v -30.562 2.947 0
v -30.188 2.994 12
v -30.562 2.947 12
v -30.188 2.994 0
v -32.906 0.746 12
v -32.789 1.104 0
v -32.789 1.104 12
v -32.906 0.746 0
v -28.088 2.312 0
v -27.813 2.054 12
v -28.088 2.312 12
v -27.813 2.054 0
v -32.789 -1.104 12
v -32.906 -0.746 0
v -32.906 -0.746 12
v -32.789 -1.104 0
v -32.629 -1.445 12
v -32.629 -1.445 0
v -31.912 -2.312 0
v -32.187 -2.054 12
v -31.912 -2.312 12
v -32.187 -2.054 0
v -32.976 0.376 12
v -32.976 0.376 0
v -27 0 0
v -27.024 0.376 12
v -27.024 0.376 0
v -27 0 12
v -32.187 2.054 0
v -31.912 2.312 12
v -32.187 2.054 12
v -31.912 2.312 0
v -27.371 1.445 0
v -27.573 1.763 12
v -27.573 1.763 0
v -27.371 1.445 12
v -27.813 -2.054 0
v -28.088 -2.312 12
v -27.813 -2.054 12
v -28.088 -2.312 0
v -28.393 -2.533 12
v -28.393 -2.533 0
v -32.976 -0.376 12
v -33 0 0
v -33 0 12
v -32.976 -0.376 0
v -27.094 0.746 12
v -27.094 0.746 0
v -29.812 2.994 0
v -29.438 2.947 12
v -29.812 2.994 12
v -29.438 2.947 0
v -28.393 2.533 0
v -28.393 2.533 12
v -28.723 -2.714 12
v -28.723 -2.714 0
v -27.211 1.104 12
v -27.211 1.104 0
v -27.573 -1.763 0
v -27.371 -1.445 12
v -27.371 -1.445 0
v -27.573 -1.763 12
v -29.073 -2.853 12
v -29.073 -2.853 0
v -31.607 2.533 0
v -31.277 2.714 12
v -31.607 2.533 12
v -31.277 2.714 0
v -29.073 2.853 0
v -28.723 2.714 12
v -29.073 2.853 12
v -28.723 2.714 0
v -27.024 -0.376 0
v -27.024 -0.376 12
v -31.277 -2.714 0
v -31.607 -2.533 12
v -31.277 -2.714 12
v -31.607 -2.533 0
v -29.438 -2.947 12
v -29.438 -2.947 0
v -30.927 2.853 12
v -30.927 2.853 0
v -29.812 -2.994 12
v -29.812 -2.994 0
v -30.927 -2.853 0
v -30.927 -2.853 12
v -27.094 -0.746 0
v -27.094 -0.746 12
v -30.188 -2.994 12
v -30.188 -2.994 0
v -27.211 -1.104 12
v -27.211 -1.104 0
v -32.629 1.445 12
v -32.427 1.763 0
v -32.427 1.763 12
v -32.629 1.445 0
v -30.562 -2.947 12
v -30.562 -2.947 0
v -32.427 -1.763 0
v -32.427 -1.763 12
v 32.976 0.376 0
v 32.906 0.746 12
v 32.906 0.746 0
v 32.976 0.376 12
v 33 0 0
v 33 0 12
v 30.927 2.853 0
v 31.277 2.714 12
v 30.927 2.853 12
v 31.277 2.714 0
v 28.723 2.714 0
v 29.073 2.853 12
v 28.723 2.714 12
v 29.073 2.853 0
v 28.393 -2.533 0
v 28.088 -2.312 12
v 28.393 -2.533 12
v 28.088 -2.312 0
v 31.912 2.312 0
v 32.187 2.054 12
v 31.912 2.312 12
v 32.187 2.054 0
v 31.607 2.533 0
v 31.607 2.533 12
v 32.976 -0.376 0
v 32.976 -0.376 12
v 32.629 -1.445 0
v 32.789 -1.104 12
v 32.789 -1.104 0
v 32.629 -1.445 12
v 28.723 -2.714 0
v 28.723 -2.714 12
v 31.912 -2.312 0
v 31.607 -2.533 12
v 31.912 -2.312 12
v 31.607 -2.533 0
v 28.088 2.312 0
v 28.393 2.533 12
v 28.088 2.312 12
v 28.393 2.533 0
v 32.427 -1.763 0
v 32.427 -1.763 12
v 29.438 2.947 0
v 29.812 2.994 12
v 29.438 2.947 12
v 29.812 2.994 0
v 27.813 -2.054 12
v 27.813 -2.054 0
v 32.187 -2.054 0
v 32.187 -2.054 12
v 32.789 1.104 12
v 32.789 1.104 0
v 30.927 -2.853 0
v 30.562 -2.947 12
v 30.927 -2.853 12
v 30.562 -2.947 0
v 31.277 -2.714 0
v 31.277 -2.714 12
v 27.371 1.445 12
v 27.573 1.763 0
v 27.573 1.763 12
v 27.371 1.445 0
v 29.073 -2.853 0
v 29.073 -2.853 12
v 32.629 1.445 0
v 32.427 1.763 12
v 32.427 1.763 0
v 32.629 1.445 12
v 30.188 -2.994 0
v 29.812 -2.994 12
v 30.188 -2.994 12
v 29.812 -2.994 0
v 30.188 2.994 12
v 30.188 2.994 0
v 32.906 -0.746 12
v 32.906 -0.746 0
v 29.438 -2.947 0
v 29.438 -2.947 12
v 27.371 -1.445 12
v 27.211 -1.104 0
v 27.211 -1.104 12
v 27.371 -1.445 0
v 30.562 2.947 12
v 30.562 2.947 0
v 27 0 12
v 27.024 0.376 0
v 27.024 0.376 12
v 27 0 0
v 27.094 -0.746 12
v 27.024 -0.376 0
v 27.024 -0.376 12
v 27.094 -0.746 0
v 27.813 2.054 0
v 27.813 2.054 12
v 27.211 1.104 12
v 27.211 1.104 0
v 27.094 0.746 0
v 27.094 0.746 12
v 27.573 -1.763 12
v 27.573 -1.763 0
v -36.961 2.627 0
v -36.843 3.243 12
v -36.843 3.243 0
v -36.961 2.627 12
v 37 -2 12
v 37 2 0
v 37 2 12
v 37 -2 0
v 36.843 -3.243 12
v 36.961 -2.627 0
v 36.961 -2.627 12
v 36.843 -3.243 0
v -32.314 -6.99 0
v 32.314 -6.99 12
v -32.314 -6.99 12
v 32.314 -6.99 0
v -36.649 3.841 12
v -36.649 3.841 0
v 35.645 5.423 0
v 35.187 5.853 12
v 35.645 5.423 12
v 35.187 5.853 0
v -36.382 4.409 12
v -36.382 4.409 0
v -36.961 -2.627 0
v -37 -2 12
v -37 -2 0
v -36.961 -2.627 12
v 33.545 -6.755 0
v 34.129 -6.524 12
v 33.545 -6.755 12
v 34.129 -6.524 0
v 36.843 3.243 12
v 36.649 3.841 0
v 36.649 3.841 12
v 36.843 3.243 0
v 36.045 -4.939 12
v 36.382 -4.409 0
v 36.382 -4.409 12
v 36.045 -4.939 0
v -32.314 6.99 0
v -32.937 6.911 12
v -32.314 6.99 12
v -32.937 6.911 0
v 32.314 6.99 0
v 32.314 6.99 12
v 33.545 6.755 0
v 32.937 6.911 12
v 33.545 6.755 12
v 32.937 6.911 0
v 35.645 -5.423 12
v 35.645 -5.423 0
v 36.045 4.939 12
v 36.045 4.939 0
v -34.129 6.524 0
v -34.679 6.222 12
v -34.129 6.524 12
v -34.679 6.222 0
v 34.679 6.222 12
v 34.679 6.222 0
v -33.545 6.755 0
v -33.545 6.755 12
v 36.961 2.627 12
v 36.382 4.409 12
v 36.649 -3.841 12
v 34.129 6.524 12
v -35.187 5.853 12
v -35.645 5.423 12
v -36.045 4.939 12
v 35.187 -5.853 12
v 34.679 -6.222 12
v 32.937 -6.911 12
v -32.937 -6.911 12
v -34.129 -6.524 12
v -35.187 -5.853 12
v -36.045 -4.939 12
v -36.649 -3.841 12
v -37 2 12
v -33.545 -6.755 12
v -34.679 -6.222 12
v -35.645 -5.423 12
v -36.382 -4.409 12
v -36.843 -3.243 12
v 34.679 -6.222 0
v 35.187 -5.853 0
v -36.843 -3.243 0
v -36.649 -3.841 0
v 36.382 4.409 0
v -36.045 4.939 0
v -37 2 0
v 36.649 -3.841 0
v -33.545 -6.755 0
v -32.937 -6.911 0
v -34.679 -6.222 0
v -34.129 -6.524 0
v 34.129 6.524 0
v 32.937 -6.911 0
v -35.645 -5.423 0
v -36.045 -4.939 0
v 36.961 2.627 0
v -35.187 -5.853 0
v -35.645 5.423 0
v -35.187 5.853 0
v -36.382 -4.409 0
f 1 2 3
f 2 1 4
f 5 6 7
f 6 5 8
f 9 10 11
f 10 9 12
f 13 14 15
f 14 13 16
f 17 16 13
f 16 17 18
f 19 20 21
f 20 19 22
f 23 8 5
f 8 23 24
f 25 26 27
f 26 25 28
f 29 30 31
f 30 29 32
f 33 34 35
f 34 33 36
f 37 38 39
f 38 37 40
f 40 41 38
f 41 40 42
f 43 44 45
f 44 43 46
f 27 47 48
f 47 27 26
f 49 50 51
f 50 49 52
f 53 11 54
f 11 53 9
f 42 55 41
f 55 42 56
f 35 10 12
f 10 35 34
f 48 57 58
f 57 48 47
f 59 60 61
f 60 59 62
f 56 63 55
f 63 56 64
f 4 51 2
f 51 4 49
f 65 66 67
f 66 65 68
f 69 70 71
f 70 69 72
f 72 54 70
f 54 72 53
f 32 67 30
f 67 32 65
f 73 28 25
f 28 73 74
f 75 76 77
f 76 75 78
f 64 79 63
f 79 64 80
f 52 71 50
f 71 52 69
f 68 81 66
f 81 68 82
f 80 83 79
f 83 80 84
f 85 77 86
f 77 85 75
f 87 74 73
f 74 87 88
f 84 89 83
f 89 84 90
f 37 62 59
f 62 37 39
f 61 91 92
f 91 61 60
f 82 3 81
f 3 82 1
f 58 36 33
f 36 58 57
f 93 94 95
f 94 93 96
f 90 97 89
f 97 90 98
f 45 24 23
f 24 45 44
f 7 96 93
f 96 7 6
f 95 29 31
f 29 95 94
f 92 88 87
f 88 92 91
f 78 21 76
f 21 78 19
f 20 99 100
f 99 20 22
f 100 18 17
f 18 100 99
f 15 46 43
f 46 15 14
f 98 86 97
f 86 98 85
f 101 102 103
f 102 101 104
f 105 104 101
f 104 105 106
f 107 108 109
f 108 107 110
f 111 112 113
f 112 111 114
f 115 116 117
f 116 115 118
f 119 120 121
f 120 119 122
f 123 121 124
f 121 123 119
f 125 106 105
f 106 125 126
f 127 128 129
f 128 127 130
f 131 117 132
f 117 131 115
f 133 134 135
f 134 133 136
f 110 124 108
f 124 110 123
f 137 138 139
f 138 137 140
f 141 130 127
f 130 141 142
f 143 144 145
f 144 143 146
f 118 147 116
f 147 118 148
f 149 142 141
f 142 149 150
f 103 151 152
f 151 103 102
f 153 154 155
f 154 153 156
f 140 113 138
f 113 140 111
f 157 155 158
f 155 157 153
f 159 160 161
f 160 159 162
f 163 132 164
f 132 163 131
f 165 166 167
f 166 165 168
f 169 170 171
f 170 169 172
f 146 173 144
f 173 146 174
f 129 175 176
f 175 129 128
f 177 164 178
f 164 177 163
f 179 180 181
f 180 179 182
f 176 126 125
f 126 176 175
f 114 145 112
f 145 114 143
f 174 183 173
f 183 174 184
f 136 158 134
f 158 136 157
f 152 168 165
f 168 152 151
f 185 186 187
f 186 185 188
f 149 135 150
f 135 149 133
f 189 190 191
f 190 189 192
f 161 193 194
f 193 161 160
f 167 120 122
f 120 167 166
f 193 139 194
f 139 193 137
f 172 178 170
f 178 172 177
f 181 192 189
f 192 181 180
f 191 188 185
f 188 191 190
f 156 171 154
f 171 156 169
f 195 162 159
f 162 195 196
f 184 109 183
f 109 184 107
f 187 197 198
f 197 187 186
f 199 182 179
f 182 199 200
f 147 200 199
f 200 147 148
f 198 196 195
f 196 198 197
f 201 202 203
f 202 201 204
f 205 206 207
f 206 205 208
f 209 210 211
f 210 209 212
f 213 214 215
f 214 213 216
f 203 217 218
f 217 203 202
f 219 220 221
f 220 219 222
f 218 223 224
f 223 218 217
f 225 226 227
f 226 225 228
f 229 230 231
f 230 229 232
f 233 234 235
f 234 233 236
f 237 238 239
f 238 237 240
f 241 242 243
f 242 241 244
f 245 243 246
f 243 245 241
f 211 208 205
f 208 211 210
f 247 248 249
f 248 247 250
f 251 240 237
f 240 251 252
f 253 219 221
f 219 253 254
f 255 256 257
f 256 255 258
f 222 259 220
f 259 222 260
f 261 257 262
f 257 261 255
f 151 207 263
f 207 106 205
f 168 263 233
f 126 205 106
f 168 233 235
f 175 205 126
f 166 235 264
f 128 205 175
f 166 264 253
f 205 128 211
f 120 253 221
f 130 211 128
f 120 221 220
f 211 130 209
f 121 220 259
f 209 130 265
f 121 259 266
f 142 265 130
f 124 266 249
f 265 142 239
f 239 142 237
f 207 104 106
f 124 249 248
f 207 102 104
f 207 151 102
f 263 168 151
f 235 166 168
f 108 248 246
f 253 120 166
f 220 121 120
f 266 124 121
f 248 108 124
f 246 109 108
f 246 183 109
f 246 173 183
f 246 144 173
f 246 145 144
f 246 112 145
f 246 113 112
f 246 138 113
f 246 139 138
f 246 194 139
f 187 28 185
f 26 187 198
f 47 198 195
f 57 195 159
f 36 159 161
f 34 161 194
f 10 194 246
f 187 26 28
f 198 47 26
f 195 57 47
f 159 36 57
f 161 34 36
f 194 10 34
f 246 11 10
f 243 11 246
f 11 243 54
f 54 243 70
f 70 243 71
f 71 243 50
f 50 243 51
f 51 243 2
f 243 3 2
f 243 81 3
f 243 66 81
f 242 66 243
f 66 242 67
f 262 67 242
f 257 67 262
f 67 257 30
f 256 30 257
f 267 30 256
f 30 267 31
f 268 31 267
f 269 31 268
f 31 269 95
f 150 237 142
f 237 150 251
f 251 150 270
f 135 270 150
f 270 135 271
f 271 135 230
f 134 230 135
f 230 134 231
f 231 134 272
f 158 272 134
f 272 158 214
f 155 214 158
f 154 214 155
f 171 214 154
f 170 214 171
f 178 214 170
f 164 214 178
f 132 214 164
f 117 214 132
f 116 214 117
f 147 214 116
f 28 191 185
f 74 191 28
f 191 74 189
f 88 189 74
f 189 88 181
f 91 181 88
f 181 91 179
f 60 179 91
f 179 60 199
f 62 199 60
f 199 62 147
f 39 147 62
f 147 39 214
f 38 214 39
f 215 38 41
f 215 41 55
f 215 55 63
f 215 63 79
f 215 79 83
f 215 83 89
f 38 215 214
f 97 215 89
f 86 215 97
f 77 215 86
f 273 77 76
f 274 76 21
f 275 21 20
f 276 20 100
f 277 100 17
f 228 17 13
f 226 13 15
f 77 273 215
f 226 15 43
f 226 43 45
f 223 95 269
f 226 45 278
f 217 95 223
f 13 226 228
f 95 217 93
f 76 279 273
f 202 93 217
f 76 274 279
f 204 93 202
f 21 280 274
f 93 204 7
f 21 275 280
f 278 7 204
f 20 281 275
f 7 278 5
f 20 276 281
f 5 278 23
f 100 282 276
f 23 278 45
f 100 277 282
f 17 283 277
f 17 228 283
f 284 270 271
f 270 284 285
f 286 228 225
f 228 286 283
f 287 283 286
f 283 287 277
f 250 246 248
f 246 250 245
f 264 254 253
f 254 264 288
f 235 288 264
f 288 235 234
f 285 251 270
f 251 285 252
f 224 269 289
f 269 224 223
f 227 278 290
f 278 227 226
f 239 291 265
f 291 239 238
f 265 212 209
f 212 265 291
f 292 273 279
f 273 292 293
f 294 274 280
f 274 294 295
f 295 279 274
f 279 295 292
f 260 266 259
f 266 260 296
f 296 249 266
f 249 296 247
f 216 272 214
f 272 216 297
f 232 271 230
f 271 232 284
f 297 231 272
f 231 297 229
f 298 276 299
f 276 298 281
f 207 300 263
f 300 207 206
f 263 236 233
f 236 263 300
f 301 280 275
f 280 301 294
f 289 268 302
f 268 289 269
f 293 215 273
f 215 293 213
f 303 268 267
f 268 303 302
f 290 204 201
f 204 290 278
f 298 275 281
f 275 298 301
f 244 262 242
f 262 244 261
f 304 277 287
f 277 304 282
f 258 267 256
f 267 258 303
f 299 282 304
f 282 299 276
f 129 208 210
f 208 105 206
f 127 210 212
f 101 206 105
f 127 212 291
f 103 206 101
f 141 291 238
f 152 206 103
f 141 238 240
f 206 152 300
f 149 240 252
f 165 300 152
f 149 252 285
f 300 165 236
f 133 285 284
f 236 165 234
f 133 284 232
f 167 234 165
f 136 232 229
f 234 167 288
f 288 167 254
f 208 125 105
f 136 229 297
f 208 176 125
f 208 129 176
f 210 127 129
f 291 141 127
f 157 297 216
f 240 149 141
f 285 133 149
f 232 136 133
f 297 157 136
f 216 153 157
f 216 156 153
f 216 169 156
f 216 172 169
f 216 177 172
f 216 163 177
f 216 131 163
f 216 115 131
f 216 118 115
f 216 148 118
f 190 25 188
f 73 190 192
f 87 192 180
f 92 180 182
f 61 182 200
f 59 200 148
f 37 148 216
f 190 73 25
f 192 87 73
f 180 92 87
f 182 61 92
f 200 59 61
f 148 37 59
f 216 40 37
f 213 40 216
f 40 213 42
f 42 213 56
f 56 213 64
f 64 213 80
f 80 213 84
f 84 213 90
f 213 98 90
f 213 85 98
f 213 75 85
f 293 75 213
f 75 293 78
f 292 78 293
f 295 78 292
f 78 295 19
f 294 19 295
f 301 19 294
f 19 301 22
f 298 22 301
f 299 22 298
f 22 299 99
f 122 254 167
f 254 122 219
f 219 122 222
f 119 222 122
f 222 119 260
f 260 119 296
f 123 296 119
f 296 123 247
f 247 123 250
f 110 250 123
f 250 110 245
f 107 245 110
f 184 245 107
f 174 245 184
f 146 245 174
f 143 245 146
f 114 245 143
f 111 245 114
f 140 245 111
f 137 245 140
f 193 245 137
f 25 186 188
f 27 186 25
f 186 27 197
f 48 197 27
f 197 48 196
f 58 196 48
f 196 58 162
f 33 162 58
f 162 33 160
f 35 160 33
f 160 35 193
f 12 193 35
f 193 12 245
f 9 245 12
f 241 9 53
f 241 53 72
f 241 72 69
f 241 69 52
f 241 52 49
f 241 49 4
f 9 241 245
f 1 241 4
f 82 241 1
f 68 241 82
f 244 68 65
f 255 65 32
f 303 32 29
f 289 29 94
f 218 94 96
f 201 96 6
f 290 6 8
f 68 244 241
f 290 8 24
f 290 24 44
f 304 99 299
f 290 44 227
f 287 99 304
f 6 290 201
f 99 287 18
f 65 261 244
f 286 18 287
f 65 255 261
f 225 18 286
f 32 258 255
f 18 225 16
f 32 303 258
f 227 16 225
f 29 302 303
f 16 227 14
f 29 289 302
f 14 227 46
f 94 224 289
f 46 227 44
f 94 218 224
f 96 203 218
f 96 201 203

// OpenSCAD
$fn = 50;


difference() {
	union() {
		hull() {
			translate(v = [-32.0000000000, 2.0000000000, 0]) {
				cylinder(h = 12, r = 5);
			}
			translate(v = [32.0000000000, 2.0000000000, 0]) {
				cylinder(h = 12, r = 5);
			}
			translate(v = [-32.0000000000, -2.0000000000, 0]) {
				cylinder(h = 12, r = 5);
			}
			translate(v = [32.0000000000, -2.0000000000, 0]) {
				cylinder(h = 12, r = 5);
			}
		}
	}
	union() {
		translate(v = [-30.0000000000, 0.0000000000, -100.0000000000]) {
			cylinder(h = 200, r = 3.0000000000);
		}
		translate(v = [-30.0000000000, 0.0000000000, -100.0000000000]) {
			cylinder(h = 200, r = 3.0000000000);
		}
		translate(v = [30.0000000000, 0.0000000000, -100.0000000000]) {
			cylinder(h = 200, r = 3.0000000000);
		}
		translate(v = [30.0000000000, 0.0000000000, -100.0000000000]) {
			cylinder(h = 200, r = 3.0000000000);
		}
	}
}
